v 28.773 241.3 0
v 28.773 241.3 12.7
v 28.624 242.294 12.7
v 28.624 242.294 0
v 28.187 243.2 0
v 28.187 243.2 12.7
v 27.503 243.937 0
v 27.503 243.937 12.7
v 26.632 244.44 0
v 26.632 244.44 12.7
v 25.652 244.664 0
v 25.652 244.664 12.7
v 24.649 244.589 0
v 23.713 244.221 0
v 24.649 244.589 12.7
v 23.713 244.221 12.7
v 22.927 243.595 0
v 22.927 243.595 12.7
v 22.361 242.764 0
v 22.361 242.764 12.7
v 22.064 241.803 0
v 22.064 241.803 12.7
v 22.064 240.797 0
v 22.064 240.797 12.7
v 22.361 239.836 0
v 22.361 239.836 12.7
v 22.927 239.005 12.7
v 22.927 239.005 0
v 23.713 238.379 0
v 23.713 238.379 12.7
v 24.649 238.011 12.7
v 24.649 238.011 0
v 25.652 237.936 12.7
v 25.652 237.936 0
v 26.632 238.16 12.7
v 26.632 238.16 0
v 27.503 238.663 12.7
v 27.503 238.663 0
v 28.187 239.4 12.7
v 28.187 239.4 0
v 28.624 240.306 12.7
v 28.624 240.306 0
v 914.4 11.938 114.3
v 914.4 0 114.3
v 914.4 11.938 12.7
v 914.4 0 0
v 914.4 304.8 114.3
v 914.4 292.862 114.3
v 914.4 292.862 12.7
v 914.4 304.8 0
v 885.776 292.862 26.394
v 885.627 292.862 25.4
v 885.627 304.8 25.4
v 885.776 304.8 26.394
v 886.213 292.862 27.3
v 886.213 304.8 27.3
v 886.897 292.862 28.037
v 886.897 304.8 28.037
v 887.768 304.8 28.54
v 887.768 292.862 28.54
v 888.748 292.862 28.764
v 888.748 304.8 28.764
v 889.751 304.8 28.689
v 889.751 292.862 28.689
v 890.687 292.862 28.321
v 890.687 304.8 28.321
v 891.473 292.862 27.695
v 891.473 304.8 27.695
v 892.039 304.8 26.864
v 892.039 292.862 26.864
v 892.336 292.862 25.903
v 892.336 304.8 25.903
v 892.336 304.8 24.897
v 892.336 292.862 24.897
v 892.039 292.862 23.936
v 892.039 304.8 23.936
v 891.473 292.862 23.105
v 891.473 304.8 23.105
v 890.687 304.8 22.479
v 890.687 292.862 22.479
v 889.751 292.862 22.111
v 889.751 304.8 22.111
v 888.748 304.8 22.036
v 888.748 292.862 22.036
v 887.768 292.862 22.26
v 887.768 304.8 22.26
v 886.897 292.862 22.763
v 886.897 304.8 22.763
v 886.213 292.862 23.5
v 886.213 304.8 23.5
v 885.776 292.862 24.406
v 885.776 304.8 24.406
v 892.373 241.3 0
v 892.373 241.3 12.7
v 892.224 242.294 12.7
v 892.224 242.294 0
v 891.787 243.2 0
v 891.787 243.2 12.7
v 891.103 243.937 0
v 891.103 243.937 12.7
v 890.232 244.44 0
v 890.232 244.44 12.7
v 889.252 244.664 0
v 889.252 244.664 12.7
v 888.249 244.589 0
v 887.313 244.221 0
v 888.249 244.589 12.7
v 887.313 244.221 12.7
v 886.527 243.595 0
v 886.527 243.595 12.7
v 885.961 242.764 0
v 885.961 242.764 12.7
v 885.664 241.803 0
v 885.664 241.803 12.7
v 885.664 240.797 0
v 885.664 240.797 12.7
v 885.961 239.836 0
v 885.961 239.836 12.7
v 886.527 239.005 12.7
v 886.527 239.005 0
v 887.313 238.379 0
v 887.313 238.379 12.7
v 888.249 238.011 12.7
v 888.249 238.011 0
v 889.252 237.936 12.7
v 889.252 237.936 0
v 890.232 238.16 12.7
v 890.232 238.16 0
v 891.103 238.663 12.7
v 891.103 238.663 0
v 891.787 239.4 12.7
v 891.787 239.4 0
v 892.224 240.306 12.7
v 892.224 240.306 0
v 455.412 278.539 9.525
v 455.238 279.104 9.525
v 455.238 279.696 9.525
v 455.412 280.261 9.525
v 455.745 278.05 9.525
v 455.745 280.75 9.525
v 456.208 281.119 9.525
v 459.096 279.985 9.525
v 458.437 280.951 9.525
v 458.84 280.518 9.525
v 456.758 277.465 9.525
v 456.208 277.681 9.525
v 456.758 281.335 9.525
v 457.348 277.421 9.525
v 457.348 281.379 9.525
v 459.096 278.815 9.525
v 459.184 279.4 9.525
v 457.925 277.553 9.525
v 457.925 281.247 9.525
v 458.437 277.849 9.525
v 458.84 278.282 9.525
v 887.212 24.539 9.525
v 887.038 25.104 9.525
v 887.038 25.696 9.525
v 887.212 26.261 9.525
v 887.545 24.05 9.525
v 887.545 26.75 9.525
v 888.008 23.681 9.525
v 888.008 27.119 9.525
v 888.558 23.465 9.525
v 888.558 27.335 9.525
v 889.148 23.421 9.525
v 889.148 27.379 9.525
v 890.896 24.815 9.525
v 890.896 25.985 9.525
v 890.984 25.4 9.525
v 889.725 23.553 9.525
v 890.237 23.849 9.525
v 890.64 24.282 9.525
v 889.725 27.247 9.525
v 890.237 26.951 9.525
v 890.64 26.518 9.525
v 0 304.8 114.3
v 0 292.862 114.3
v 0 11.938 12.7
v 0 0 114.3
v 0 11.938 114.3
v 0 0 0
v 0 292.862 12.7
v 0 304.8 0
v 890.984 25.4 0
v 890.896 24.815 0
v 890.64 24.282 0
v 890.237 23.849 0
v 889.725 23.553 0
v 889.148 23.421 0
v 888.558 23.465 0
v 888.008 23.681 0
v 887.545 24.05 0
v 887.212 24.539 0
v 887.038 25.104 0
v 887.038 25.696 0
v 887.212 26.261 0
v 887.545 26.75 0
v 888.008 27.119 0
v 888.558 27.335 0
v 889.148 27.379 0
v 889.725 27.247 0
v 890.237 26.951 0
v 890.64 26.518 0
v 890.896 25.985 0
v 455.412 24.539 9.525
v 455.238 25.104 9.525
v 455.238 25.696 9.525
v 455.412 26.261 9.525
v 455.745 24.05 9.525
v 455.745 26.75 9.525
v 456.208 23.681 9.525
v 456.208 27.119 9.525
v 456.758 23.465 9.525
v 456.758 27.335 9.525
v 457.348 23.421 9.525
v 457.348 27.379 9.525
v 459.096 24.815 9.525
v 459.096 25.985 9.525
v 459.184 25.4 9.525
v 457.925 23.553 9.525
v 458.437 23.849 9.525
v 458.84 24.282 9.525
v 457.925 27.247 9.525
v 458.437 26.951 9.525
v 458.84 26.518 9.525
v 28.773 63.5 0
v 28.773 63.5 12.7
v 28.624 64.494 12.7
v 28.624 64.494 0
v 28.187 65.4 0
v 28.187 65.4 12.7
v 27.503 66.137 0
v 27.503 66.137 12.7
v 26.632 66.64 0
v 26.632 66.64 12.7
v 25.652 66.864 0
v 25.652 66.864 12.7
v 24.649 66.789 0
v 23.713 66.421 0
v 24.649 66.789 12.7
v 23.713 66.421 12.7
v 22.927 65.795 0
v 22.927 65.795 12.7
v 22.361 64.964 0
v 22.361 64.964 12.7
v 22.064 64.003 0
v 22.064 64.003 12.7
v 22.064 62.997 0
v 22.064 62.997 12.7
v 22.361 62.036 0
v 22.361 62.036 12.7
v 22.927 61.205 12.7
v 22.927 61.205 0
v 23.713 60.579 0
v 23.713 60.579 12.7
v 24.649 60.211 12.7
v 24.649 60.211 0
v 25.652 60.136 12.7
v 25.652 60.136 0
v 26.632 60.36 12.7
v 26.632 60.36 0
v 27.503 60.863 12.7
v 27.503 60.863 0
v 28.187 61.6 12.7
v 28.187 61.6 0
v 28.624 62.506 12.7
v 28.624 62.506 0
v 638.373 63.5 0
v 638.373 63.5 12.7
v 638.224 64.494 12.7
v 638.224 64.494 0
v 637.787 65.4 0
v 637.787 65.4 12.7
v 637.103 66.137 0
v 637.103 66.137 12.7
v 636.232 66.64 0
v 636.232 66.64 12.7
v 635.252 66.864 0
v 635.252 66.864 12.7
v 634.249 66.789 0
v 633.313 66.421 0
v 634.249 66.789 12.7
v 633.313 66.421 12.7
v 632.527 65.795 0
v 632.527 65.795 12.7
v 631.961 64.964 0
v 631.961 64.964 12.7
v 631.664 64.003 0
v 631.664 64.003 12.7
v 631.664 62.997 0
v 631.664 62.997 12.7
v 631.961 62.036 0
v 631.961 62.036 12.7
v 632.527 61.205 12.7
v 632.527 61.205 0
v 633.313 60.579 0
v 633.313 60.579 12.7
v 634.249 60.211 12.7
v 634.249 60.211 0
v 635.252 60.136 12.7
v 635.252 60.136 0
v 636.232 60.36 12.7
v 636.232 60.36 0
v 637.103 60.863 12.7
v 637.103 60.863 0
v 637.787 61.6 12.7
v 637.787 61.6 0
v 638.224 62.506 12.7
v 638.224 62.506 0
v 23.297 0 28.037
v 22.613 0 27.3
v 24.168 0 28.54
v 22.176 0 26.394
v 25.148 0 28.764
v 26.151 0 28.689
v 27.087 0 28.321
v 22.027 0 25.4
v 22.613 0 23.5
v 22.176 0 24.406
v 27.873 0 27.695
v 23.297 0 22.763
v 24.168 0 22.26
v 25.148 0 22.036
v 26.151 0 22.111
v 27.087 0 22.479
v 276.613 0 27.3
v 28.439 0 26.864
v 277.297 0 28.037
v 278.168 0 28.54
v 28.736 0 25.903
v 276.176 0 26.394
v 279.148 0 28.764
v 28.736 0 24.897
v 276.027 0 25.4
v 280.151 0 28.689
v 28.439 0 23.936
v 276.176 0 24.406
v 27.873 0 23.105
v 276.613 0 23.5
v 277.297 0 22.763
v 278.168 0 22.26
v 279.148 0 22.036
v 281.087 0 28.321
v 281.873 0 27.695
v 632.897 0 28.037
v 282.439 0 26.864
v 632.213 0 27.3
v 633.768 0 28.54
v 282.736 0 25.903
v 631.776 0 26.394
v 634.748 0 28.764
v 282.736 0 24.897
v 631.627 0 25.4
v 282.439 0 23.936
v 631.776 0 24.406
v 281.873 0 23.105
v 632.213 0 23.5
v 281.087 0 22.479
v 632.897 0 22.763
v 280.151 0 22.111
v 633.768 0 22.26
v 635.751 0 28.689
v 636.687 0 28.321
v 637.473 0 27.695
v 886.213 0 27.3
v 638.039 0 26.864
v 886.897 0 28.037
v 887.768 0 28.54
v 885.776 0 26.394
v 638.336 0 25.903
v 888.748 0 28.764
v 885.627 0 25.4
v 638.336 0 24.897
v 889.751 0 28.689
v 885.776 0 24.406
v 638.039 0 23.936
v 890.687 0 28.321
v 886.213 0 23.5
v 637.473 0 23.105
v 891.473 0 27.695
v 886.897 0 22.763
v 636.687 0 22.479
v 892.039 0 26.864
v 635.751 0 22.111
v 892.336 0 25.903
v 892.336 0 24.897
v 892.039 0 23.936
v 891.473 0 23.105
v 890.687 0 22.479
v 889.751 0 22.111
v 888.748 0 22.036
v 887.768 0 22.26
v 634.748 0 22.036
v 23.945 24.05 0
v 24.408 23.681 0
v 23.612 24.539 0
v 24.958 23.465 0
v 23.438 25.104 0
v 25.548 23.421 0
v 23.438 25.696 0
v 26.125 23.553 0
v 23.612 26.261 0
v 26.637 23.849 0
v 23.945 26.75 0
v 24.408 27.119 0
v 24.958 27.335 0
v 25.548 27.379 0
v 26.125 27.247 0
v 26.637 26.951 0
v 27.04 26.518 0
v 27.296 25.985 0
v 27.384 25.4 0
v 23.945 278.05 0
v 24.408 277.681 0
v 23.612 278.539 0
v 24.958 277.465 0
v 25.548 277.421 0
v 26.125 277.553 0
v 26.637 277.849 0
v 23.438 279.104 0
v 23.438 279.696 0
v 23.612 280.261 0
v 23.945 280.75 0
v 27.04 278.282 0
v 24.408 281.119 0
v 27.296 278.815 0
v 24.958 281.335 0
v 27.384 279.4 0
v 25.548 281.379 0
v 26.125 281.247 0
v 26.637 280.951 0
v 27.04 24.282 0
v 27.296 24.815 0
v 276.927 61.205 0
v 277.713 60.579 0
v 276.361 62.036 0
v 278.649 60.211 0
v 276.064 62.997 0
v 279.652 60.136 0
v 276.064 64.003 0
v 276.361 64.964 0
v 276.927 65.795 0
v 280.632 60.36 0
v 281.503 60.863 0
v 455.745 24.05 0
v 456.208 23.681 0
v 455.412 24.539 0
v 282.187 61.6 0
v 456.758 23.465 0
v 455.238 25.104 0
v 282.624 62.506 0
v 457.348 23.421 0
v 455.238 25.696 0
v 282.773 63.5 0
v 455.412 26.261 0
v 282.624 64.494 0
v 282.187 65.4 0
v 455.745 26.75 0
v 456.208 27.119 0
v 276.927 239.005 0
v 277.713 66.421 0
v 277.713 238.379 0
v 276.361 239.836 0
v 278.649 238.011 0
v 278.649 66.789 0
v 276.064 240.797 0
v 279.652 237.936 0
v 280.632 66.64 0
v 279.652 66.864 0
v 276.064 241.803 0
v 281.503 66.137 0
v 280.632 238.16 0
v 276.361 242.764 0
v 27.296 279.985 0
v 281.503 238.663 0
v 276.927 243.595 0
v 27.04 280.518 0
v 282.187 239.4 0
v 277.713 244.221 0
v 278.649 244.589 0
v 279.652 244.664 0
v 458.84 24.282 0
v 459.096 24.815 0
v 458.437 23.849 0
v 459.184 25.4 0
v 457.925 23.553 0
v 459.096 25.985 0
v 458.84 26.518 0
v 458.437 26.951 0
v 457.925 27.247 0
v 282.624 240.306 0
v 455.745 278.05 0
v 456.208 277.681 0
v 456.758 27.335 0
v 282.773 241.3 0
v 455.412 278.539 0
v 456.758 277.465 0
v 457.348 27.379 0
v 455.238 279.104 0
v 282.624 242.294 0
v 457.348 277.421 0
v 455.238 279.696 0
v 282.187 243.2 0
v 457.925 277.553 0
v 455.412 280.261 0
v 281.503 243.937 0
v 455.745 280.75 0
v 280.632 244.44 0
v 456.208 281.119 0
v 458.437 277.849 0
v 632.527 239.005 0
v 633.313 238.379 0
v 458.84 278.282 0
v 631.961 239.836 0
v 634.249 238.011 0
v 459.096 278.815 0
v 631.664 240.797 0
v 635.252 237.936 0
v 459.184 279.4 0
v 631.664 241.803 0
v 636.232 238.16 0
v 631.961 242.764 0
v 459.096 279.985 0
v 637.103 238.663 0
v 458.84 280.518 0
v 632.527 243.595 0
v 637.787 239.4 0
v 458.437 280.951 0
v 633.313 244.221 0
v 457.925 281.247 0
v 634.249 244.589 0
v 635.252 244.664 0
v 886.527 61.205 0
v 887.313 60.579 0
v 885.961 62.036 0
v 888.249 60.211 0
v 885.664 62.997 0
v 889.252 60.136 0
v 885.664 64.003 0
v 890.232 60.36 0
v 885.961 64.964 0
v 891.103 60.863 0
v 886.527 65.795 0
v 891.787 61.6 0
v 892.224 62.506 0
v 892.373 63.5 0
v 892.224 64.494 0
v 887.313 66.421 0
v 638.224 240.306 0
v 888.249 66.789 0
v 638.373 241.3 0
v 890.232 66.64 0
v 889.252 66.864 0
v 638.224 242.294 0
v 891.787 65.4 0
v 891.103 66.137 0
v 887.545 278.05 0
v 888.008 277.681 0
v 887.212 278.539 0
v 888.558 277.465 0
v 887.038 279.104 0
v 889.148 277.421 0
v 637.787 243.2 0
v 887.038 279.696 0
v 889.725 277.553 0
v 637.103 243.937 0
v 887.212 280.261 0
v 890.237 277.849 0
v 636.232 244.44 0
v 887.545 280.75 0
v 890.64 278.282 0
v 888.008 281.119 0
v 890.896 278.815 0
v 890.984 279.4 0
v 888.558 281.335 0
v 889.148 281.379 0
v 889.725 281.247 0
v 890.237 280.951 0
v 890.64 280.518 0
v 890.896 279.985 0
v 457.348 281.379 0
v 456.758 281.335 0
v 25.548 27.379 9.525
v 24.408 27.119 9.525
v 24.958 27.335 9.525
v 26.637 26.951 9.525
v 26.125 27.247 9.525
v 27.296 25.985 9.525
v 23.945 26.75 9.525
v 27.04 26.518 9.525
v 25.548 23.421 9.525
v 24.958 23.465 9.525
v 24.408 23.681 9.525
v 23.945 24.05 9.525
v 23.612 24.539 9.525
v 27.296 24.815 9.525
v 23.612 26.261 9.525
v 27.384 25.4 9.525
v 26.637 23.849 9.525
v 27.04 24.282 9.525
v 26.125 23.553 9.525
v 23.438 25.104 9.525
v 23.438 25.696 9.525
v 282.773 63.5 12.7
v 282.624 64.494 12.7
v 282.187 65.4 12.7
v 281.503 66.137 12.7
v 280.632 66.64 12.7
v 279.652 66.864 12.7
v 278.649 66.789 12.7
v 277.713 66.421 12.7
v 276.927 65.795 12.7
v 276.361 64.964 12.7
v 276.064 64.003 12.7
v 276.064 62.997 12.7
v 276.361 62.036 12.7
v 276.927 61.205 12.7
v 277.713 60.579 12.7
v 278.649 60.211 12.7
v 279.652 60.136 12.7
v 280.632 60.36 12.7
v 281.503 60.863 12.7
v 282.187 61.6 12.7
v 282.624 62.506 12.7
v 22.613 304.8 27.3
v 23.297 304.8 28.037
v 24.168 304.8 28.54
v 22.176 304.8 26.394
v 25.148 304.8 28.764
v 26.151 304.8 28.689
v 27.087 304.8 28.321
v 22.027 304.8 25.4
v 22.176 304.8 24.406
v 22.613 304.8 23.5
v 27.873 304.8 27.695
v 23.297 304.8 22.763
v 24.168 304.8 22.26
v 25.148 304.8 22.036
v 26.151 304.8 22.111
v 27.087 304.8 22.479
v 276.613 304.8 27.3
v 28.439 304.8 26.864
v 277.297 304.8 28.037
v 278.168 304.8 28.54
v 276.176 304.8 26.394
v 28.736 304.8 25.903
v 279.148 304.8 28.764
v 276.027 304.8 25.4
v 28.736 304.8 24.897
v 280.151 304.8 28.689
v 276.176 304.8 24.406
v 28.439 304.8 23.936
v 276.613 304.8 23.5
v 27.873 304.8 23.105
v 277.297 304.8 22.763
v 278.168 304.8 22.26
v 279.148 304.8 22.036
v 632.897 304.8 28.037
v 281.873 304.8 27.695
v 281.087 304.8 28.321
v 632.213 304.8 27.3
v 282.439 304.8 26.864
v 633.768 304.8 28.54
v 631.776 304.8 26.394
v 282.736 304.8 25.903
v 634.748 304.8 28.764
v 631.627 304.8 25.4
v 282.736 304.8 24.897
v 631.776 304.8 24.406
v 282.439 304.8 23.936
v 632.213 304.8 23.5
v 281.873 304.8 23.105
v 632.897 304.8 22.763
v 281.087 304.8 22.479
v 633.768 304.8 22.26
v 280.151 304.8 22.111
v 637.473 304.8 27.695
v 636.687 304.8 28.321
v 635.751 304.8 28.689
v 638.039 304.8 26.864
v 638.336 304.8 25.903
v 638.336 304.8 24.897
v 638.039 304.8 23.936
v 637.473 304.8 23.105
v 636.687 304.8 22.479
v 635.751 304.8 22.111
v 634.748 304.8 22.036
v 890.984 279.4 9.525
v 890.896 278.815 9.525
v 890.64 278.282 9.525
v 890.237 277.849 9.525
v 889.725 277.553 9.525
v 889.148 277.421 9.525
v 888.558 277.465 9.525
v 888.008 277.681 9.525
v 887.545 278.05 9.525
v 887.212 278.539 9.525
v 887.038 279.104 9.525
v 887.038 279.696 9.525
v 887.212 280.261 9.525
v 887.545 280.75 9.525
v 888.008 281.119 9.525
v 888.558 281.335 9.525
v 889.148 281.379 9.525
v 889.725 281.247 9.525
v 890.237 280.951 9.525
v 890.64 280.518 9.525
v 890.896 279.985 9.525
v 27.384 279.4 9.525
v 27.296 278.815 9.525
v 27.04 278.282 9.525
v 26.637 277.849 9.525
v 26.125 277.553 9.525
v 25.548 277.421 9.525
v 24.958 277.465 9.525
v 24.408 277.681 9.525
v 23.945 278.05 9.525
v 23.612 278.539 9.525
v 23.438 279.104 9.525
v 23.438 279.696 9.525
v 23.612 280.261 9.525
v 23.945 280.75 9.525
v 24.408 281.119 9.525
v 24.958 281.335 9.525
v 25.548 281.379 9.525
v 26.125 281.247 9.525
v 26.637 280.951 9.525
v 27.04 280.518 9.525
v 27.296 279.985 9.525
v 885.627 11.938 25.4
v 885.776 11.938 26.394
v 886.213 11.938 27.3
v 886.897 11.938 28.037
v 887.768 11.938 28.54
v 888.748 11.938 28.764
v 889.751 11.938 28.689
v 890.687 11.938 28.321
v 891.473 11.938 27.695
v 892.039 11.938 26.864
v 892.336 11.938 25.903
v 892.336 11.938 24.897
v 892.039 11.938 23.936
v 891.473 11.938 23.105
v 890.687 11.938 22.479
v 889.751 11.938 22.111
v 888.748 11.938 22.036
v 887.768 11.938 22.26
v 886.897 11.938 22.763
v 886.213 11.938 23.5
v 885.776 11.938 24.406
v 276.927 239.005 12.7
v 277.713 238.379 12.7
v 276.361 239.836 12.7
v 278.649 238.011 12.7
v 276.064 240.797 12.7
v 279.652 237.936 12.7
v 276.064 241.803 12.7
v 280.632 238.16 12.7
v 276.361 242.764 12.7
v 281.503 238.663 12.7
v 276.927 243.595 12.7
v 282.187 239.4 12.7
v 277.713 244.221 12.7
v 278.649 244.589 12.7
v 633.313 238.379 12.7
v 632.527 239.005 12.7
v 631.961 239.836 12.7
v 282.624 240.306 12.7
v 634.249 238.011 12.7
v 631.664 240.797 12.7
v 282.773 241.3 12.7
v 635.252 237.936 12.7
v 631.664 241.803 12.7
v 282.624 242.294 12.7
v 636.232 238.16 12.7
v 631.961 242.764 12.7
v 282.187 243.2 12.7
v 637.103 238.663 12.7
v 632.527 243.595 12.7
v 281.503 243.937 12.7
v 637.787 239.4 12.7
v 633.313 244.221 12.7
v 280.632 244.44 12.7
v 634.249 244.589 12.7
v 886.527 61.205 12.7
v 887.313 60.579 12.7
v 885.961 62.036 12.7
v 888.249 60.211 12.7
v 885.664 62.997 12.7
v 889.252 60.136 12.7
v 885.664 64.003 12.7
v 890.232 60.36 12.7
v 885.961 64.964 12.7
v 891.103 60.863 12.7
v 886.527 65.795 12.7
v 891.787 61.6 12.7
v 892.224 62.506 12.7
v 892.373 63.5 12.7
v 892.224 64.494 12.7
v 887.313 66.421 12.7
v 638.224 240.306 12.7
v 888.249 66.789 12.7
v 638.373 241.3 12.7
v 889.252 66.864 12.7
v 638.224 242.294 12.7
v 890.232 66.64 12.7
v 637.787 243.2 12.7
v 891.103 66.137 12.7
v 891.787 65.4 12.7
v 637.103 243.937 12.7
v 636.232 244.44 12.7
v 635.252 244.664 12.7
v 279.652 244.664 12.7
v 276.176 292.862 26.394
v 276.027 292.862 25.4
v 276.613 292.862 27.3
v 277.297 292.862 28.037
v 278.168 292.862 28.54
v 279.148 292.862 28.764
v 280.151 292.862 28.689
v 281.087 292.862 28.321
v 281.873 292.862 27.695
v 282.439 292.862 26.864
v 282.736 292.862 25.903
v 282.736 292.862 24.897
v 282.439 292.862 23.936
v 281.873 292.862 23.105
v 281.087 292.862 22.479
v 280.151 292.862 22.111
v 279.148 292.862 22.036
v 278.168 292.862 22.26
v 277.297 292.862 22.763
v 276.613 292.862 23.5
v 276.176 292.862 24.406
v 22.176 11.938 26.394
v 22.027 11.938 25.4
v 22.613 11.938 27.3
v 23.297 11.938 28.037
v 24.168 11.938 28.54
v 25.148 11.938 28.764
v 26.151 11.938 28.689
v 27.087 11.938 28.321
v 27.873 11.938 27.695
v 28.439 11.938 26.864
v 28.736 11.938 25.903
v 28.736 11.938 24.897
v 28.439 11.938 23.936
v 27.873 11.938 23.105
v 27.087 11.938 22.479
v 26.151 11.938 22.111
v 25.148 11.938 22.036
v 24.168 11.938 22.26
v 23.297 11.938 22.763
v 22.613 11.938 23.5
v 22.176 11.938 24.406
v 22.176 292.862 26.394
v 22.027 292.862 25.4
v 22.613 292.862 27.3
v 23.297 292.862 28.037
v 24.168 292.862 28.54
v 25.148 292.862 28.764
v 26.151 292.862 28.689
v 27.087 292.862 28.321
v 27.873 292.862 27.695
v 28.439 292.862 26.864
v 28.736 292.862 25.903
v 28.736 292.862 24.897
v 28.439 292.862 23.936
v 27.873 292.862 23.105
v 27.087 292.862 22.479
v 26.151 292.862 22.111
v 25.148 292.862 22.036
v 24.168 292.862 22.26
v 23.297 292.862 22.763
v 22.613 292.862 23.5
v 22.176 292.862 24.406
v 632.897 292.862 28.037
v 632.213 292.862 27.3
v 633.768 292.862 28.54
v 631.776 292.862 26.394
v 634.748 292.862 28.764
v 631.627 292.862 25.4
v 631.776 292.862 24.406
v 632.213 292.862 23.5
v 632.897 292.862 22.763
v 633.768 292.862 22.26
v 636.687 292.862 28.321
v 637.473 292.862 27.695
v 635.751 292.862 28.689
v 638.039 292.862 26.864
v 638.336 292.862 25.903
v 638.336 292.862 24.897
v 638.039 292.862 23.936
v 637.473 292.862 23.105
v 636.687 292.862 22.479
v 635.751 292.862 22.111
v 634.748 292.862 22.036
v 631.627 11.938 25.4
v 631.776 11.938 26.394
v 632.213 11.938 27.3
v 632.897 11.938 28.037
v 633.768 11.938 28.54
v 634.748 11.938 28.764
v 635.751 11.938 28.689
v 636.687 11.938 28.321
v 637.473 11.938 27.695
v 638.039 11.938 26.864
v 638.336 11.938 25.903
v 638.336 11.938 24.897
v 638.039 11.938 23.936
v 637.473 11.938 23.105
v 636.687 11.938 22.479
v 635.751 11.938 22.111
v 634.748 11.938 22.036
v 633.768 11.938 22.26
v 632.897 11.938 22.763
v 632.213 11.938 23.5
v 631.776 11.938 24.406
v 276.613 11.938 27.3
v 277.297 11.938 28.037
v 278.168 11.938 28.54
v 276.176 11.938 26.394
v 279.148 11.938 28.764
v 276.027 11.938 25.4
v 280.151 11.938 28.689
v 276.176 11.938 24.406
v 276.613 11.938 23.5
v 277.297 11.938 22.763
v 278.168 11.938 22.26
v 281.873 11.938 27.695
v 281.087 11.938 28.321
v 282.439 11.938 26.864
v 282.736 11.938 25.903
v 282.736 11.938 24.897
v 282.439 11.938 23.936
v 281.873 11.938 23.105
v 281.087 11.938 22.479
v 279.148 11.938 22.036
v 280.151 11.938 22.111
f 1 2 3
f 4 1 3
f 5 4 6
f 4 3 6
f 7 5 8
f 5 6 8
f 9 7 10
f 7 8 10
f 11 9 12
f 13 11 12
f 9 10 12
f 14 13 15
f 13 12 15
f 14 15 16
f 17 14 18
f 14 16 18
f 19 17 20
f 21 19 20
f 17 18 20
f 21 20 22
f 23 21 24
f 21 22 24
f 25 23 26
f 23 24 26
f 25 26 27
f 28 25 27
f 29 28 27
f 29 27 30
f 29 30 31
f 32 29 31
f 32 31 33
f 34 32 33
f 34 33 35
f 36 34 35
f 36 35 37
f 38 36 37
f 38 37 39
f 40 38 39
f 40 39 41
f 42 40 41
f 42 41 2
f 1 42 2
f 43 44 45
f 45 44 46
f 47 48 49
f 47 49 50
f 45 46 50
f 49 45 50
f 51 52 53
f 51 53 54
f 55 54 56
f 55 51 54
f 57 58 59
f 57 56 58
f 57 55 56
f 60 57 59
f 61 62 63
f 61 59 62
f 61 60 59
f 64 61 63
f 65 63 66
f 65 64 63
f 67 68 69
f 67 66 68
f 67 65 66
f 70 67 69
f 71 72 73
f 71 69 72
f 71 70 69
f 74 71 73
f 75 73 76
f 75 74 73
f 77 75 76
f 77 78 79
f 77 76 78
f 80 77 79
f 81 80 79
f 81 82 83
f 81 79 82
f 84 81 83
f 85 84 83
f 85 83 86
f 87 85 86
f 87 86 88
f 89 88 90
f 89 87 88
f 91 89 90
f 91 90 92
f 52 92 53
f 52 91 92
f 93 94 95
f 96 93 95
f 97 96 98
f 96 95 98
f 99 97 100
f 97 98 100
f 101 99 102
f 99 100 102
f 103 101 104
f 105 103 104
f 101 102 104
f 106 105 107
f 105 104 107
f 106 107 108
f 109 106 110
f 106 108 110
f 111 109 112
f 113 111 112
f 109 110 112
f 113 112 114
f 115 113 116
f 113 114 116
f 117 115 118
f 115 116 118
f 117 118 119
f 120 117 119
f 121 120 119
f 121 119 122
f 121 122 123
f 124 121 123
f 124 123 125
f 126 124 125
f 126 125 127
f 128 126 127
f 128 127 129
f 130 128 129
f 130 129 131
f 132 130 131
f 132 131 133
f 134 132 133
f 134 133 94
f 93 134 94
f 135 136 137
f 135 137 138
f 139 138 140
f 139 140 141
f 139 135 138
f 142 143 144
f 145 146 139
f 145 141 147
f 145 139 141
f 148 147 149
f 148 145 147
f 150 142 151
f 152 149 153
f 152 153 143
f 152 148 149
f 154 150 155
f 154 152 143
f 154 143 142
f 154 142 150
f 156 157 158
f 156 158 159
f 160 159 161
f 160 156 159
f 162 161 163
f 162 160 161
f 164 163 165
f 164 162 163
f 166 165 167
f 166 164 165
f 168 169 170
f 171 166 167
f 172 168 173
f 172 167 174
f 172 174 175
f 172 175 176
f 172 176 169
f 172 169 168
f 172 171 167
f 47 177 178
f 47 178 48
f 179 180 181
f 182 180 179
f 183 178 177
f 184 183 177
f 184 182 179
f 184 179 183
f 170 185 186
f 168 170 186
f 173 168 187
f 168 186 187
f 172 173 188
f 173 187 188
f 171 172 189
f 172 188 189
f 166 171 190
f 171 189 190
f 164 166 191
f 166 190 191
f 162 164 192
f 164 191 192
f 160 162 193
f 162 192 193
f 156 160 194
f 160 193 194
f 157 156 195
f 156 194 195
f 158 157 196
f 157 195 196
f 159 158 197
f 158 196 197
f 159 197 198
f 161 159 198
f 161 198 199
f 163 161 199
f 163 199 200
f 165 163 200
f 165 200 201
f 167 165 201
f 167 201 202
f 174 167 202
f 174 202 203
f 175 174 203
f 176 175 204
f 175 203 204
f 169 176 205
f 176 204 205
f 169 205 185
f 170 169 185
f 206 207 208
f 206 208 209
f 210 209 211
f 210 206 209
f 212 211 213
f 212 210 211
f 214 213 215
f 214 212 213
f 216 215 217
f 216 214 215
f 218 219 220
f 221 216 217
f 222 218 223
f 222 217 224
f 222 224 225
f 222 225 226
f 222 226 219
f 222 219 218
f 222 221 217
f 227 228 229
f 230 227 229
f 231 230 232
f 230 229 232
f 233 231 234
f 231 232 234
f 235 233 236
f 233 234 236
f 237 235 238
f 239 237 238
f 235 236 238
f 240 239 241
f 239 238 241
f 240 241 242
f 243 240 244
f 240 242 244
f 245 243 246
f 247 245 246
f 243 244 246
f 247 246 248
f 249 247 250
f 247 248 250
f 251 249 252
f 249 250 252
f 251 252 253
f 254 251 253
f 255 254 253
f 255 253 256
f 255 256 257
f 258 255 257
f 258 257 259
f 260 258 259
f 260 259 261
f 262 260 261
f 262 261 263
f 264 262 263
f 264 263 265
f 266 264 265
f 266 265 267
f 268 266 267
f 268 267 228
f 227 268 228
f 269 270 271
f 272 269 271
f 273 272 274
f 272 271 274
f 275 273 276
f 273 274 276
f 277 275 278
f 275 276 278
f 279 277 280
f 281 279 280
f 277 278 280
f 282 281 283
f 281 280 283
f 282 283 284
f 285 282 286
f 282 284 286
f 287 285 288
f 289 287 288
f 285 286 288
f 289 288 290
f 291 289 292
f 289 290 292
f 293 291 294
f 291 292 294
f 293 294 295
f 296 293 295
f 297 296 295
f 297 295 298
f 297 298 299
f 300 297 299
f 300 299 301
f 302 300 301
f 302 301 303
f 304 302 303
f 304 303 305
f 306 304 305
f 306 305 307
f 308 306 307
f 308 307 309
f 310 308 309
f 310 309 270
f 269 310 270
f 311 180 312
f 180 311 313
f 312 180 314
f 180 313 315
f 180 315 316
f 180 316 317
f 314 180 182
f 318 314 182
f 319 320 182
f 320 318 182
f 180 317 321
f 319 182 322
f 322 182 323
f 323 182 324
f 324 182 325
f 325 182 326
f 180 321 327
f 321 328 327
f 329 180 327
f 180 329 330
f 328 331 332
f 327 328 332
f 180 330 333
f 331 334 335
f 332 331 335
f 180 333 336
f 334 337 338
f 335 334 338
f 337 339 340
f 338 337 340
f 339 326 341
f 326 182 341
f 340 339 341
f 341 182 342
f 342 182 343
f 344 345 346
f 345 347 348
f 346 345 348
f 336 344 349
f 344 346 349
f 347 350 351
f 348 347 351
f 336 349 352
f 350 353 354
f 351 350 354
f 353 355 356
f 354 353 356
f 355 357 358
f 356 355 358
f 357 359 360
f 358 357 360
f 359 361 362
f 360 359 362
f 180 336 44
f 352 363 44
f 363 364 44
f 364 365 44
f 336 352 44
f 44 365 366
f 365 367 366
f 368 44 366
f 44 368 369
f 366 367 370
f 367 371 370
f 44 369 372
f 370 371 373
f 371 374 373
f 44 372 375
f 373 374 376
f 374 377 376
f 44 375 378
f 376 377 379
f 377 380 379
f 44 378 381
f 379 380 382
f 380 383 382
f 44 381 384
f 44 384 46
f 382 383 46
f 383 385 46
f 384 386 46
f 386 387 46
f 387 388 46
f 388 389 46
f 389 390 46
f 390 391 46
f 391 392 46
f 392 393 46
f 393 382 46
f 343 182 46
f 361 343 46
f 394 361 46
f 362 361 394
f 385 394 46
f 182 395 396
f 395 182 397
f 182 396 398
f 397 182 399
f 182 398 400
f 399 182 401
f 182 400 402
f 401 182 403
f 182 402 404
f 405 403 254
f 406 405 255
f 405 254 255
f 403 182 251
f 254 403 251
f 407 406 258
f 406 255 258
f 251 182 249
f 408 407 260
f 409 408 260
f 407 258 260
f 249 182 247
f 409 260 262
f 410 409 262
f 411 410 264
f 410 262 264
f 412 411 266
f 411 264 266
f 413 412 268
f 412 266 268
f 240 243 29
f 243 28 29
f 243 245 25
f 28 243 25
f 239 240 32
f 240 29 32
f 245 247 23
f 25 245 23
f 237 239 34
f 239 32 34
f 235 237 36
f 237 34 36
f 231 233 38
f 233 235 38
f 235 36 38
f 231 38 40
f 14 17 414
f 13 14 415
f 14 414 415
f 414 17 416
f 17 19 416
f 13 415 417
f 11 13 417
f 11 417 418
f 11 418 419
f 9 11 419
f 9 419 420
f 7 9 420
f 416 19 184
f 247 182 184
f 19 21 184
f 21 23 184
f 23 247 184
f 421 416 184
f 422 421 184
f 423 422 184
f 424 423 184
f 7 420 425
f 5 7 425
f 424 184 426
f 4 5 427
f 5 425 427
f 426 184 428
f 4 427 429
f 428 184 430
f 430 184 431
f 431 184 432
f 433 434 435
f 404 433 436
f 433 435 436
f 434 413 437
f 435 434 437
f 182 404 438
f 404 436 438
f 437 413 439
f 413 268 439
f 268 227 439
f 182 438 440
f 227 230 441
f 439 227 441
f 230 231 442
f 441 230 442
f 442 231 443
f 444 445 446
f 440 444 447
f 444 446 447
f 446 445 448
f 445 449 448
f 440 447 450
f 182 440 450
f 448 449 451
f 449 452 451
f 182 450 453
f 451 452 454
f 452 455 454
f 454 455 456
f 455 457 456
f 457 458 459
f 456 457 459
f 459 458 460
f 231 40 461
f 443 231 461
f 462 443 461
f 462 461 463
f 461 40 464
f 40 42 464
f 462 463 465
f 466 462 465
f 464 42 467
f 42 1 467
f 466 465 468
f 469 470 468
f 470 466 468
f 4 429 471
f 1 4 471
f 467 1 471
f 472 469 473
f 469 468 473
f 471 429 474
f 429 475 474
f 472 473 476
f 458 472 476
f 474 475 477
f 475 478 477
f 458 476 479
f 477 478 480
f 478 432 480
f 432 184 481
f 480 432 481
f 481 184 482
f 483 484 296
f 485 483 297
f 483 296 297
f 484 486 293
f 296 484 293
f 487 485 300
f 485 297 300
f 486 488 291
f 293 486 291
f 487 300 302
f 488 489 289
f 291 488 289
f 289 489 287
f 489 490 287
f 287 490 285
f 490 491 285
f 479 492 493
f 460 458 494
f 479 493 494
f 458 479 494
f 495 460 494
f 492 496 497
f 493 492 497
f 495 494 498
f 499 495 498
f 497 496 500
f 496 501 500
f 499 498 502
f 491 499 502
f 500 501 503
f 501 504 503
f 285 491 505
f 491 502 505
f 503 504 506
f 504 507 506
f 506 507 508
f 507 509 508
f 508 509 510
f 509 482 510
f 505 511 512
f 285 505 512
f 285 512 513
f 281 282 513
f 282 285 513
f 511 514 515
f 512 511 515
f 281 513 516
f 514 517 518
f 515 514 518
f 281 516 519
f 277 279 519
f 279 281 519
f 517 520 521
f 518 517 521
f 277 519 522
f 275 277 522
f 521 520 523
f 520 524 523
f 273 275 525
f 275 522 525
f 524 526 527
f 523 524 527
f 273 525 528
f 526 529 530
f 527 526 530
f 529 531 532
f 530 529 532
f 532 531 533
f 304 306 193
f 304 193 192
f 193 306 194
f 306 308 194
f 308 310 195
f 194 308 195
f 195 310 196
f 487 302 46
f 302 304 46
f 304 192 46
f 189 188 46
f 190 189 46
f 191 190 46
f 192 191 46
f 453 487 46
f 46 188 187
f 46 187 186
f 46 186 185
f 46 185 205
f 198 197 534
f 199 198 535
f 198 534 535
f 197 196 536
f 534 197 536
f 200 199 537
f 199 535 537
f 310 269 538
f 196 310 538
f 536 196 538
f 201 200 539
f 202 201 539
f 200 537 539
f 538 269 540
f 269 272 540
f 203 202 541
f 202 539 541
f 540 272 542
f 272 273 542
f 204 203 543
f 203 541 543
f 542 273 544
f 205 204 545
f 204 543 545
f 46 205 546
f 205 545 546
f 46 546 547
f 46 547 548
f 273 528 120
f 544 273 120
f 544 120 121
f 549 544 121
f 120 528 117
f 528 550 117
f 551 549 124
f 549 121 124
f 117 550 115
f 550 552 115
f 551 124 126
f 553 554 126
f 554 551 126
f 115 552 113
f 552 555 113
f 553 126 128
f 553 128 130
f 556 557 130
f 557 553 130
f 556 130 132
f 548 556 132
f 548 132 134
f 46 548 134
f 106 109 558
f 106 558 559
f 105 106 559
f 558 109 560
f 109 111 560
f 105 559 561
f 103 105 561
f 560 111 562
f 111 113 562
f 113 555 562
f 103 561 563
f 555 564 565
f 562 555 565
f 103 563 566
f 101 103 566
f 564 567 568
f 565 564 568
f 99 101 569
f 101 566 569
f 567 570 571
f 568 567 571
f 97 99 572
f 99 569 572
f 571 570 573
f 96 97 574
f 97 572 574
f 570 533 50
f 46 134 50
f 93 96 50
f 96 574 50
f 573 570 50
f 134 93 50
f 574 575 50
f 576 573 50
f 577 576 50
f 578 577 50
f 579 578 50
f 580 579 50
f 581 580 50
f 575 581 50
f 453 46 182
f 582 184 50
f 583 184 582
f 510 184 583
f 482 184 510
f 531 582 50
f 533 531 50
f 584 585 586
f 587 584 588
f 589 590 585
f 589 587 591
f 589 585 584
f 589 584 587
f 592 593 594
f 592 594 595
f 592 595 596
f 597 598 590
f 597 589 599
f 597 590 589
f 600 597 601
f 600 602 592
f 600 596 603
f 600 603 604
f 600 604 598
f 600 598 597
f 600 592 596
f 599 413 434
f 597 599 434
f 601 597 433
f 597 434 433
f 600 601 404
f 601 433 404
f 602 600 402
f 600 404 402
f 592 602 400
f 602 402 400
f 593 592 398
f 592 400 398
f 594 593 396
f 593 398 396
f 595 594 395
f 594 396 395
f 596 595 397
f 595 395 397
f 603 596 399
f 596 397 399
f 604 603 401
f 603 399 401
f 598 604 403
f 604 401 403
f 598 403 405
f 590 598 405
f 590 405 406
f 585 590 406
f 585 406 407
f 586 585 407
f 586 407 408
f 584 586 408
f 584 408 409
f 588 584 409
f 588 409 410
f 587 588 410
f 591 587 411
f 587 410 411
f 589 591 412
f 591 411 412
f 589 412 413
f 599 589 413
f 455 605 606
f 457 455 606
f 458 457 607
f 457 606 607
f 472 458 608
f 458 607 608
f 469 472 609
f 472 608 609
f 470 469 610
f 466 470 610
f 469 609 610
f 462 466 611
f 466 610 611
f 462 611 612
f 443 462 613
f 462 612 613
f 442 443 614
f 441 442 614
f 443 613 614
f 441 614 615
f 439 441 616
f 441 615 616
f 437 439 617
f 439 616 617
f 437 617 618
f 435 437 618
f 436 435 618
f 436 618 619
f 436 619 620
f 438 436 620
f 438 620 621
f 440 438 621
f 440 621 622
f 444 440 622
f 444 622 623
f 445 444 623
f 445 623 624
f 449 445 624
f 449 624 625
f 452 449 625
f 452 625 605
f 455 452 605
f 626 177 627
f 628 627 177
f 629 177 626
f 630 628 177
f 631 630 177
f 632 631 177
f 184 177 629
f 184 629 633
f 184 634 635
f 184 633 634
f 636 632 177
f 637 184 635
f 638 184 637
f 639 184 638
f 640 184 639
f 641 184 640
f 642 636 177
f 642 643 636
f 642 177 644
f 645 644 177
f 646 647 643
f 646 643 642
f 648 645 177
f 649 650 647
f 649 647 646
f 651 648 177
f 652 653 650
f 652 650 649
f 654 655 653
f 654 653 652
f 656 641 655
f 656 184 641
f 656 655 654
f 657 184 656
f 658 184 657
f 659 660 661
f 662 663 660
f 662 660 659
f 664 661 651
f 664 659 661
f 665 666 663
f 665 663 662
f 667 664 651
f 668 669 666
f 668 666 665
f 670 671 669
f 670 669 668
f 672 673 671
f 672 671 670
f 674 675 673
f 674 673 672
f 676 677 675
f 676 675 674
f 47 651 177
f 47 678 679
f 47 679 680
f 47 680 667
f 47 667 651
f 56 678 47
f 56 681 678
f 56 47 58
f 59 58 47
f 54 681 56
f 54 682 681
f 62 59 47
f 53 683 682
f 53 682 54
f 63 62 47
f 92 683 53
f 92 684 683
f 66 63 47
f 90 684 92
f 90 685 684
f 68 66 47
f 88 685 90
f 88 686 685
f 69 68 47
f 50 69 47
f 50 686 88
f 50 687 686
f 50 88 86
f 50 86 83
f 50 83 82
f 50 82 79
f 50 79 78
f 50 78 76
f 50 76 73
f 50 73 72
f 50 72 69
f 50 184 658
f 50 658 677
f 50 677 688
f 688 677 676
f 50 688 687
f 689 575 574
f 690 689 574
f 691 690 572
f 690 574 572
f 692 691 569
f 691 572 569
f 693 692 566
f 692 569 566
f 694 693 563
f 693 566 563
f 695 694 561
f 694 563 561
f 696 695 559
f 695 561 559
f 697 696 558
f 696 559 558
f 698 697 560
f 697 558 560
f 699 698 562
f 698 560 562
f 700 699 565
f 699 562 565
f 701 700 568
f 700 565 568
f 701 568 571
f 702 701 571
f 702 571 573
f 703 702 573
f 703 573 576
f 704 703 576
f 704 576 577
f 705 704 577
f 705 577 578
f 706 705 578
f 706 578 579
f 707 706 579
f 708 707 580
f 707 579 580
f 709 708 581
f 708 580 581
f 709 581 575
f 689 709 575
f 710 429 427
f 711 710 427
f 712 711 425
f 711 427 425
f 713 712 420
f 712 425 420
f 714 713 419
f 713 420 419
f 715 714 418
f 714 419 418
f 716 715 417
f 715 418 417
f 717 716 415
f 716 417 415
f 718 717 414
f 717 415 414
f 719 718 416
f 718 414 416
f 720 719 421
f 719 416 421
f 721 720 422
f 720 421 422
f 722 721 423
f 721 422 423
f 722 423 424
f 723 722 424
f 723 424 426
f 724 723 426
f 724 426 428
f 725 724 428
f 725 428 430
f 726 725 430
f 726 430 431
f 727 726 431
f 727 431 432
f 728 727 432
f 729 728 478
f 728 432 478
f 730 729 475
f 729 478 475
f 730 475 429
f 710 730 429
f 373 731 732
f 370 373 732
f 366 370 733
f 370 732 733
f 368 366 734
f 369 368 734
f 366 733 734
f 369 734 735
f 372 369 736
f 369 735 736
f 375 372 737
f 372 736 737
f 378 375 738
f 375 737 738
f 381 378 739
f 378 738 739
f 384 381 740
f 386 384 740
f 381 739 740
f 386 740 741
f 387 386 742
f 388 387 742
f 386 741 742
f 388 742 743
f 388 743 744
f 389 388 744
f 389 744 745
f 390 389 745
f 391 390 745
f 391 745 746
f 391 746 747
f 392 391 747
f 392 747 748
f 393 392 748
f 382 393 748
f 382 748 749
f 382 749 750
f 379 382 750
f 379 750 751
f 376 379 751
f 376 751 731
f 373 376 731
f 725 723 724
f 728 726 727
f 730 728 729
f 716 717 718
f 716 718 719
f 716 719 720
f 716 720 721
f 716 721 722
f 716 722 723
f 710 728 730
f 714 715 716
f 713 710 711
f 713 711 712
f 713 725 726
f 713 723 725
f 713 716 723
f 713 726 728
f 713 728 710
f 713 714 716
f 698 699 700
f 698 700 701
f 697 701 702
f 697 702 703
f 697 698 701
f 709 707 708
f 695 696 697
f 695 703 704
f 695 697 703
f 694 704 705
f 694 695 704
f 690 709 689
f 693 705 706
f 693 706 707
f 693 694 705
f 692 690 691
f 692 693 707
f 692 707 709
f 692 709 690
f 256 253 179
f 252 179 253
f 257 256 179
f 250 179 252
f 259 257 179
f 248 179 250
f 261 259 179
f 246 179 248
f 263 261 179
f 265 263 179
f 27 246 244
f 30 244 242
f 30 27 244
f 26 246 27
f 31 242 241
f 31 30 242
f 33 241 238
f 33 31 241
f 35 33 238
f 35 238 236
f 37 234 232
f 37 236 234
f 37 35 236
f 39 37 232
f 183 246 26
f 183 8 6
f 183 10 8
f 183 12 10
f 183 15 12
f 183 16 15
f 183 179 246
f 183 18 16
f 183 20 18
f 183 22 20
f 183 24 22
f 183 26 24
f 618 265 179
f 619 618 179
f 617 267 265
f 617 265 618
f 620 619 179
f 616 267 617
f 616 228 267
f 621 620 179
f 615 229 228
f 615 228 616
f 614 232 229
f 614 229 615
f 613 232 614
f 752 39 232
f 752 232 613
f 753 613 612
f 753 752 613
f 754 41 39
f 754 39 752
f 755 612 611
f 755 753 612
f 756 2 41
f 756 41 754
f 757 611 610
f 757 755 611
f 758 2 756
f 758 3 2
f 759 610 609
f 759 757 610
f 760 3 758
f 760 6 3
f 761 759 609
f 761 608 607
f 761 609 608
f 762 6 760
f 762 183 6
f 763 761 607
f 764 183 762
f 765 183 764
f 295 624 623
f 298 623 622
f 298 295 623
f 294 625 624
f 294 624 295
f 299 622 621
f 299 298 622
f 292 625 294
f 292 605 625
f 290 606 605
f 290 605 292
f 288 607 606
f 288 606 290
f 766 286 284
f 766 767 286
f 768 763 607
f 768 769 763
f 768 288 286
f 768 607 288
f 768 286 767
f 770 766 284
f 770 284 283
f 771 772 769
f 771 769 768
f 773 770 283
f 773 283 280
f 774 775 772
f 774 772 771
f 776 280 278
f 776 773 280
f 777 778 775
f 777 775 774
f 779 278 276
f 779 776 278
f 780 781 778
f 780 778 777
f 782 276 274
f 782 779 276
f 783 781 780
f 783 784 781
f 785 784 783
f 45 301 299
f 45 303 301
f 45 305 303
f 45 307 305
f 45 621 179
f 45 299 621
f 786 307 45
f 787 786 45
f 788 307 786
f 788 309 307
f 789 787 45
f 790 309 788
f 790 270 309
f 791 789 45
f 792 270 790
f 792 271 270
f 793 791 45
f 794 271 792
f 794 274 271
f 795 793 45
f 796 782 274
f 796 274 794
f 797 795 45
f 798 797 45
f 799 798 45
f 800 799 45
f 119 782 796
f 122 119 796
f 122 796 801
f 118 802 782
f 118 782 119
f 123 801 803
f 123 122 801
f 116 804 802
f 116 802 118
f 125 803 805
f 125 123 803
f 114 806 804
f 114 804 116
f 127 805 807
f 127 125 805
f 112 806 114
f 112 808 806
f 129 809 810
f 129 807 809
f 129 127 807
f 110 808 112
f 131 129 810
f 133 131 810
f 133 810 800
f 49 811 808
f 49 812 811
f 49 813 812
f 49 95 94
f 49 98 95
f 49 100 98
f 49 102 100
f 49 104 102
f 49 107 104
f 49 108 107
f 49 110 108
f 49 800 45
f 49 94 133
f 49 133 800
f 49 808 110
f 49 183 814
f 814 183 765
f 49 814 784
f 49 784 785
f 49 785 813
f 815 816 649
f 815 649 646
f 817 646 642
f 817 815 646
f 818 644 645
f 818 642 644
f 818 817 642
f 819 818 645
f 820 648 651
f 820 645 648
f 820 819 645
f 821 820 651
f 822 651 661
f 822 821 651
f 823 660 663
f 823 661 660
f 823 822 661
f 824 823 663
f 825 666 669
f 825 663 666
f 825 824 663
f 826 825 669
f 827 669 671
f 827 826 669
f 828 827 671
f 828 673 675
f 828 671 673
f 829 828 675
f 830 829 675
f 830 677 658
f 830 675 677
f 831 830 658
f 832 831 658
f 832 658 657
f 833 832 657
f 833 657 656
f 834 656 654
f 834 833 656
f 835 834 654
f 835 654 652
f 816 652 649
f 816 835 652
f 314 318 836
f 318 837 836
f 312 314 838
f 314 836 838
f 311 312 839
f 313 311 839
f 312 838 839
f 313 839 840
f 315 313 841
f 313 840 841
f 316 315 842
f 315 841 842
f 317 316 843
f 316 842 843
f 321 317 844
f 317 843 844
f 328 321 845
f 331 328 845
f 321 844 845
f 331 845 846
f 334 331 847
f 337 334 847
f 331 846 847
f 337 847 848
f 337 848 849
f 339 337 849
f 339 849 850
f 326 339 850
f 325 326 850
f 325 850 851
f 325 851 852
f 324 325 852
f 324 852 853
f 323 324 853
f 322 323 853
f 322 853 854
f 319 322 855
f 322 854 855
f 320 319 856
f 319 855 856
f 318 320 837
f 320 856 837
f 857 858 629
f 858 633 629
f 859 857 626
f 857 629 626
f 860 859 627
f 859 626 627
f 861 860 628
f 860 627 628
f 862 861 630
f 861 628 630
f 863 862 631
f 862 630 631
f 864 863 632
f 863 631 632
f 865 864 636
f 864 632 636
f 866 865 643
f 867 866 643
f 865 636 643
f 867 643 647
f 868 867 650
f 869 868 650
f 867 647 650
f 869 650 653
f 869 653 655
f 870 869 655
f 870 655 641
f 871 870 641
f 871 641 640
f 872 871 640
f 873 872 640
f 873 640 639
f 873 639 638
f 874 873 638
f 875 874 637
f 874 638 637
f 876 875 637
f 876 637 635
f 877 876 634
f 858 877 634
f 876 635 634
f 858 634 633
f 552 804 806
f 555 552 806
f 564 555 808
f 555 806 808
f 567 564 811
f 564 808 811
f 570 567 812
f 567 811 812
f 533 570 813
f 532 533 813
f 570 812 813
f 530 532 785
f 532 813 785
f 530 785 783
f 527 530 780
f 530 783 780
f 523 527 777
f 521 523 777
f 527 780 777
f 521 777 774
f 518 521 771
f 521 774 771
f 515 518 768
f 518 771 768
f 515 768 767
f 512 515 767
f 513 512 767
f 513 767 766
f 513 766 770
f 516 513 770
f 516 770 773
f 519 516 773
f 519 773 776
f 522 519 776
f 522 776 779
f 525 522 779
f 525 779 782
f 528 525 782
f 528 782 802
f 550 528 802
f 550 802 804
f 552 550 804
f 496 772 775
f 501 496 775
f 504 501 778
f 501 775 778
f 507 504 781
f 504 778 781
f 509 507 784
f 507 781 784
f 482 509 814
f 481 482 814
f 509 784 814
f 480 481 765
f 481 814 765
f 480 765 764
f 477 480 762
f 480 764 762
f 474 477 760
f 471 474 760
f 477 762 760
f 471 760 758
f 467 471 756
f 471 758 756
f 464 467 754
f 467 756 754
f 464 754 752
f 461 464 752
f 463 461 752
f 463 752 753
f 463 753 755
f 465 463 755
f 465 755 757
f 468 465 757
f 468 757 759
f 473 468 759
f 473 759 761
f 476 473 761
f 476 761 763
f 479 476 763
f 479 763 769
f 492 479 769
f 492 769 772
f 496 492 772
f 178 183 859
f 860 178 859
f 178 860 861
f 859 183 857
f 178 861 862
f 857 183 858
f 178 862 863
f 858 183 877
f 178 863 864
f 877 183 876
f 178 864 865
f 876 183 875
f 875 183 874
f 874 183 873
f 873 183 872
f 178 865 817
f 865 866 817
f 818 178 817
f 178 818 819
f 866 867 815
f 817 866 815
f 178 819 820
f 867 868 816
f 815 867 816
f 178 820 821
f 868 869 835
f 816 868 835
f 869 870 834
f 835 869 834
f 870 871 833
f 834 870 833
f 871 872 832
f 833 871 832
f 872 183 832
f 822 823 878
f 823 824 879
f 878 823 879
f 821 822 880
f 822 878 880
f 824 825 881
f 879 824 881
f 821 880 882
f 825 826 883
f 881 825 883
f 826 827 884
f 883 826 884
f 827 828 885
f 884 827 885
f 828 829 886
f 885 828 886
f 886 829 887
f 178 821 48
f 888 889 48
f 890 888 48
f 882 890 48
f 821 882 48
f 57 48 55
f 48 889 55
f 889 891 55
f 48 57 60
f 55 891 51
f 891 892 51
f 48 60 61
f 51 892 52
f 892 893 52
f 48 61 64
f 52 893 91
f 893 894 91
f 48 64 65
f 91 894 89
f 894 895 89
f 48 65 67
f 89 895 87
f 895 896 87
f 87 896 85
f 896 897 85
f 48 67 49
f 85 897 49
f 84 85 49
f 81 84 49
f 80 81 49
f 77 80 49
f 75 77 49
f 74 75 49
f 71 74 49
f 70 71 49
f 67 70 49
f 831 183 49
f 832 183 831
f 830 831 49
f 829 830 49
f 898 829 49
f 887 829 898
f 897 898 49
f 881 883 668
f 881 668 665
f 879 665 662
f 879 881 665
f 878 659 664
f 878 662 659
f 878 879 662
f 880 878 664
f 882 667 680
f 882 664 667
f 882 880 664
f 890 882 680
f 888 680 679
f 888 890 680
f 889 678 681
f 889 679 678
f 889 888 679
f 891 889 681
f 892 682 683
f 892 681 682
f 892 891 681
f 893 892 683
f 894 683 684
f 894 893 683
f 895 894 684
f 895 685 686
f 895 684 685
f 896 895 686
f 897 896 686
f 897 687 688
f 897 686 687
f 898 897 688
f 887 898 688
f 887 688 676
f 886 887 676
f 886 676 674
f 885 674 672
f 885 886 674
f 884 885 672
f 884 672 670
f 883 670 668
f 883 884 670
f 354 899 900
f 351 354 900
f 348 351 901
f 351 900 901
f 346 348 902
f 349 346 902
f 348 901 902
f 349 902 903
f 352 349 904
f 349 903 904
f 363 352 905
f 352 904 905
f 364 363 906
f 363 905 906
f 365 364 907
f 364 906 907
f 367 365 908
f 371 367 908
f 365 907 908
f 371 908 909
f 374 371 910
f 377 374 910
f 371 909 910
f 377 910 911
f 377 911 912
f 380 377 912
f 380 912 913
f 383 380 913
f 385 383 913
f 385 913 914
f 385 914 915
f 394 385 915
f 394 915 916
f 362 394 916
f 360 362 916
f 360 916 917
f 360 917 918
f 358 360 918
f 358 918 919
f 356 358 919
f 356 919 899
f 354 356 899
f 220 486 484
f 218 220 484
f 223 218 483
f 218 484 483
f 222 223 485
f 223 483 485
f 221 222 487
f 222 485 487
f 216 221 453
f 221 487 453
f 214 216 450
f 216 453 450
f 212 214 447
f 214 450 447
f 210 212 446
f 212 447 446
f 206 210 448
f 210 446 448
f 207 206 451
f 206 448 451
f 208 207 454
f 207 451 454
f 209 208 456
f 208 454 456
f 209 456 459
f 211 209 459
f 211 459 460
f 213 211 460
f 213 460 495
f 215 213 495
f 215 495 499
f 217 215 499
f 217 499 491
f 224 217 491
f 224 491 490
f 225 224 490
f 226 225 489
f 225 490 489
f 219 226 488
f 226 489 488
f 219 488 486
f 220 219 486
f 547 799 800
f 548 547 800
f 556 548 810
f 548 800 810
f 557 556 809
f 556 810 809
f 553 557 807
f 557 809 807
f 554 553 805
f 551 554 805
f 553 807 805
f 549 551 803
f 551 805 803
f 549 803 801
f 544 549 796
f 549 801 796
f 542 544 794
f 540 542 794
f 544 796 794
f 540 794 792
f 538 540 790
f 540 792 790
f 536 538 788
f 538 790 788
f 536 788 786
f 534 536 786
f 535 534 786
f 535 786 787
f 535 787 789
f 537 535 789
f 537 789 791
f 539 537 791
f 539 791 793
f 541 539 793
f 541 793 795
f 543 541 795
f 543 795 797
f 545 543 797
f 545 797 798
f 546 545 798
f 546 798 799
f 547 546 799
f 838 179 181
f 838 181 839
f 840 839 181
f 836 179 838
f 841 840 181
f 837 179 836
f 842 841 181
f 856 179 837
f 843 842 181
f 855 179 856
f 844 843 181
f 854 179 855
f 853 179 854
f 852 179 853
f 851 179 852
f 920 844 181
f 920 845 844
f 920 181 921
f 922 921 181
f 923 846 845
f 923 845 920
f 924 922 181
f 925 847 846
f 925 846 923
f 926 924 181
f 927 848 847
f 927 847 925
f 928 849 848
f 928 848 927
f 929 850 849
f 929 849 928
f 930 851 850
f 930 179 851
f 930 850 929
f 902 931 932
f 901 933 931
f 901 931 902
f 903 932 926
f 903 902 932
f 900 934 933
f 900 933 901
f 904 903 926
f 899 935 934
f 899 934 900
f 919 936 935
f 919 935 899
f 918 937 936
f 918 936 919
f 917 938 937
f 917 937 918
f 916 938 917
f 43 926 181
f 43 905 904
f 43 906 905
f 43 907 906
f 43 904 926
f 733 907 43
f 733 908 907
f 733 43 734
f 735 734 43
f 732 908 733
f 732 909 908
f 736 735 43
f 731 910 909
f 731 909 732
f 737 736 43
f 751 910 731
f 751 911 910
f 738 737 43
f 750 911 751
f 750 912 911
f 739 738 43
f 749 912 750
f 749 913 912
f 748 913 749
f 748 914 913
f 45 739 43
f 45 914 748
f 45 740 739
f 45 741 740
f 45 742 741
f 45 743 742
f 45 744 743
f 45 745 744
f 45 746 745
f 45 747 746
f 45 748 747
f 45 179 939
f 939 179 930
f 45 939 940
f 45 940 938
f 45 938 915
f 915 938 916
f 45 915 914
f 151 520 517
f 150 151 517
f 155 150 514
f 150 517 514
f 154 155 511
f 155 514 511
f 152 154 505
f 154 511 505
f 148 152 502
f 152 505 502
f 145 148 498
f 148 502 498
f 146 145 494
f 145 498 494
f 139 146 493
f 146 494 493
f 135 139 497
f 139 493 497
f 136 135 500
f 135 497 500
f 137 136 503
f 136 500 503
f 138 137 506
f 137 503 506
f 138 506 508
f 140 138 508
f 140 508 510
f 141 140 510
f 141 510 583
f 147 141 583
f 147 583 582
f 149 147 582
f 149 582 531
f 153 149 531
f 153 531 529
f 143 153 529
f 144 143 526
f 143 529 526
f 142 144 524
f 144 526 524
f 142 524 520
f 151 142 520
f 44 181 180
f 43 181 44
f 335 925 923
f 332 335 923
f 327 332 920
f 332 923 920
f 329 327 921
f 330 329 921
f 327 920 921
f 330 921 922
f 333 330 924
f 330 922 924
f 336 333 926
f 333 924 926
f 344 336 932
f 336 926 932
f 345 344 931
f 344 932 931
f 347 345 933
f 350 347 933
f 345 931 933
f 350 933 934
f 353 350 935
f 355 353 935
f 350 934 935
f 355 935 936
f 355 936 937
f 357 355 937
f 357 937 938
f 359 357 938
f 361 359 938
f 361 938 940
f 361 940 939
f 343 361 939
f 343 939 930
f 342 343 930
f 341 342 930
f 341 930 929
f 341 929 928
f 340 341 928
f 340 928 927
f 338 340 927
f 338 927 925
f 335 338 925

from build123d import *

# Parameters (mm, degrees)
F0_W     = 914.4
F0_H     = 304.8
F1_DEPTH = 12.7
F2_W     = 914.4
F2_H     = 11.938
F3_DEPTH = 101.6
F4_R     = 3.3734375
F5_DEPTH = 25.4
F6_R     = 3.3734375
F7_DEPTH = 327.66
F8_R     = 1.984375
F9_DEPTH = 9.525


with BuildPart() as f1:
    # F0 (on Top) → F1 (new body)
    with BuildSketch(Plane.XY):
        with Locations((457.2, 152.4)):
            Rectangle(F0_W, F0_H)
    extrude(amount=F1_DEPTH)

    # F2 (on face) → F3 (join)
    with BuildSketch(Plane.XY.offset(12.7)):
        with Locations((457.2, 5.969)):
            Rectangle(F2_W, F2_H)
        with Locations((457.2, 298.831)):
            Rectangle(F2_W, F2_H)
    extrude(amount=F3_DEPTH)

    # F4 (on face) → F5 (cut)
    with BuildSketch(Plane.XY.offset(12.7)):
        with Locations((25.4, 241.3)):
            Circle(F4_R)
        with Locations((279.4, 241.3)):
            Circle(F4_R)
        with Locations((279.4, 63.5)):
            Circle(F4_R)
        with Locations((635, 241.3)):
            Circle(F4_R)
        with Locations((889, 241.3)):
            Circle(F4_R)
        with Locations((635, 63.5)):
            Circle(F4_R)
        with Locations((889, 63.5)):
            Circle(F4_R)
        with Locations((25.4, 63.5)):
            Circle(F4_R)
    extrude(amount=-F5_DEPTH, mode=Mode.SUBTRACT)

    # F6 (on face) → F7 (cut, symmetric)
    with BuildSketch(Plane(origin=(0, 11.938, 0), x_dir=(-1, 0, 0), z_dir=(0, 1, 0))):
        with Locations((-889, 25.4)):
            Circle(F6_R)
        with Locations((-635, 25.4)):
            Circle(F6_R)
        with Locations((-279.4, 25.4)):
            Circle(F6_R)
        with Locations((-25.4, 25.4)):
            Circle(F6_R)
    extrude(amount=F7_DEPTH, both=True, mode=Mode.SUBTRACT)

    # F8 (on face) → F9 (cut)
    with BuildSketch(Plane(origin=(0, 0, 0), x_dir=(1, 0, 0), z_dir=(0, 0, -1))):
        with Locations((25.4, -279.4)):
            Circle(F8_R)
        with Locations((889, -279.4)):
            Circle(F8_R)
        with Locations((457.2, -279.4)):
            Circle(F8_R)
        with Locations((889, -25.4)):
            Circle(F8_R)
        with Locations((457.2, -25.4)):
            Circle(F8_R)
        with Locations((25.4, -25.4)):
            Circle(F8_R)
    extrude(amount=-F9_DEPTH, mode=Mode.SUBTRACT)


solid = f1.part
